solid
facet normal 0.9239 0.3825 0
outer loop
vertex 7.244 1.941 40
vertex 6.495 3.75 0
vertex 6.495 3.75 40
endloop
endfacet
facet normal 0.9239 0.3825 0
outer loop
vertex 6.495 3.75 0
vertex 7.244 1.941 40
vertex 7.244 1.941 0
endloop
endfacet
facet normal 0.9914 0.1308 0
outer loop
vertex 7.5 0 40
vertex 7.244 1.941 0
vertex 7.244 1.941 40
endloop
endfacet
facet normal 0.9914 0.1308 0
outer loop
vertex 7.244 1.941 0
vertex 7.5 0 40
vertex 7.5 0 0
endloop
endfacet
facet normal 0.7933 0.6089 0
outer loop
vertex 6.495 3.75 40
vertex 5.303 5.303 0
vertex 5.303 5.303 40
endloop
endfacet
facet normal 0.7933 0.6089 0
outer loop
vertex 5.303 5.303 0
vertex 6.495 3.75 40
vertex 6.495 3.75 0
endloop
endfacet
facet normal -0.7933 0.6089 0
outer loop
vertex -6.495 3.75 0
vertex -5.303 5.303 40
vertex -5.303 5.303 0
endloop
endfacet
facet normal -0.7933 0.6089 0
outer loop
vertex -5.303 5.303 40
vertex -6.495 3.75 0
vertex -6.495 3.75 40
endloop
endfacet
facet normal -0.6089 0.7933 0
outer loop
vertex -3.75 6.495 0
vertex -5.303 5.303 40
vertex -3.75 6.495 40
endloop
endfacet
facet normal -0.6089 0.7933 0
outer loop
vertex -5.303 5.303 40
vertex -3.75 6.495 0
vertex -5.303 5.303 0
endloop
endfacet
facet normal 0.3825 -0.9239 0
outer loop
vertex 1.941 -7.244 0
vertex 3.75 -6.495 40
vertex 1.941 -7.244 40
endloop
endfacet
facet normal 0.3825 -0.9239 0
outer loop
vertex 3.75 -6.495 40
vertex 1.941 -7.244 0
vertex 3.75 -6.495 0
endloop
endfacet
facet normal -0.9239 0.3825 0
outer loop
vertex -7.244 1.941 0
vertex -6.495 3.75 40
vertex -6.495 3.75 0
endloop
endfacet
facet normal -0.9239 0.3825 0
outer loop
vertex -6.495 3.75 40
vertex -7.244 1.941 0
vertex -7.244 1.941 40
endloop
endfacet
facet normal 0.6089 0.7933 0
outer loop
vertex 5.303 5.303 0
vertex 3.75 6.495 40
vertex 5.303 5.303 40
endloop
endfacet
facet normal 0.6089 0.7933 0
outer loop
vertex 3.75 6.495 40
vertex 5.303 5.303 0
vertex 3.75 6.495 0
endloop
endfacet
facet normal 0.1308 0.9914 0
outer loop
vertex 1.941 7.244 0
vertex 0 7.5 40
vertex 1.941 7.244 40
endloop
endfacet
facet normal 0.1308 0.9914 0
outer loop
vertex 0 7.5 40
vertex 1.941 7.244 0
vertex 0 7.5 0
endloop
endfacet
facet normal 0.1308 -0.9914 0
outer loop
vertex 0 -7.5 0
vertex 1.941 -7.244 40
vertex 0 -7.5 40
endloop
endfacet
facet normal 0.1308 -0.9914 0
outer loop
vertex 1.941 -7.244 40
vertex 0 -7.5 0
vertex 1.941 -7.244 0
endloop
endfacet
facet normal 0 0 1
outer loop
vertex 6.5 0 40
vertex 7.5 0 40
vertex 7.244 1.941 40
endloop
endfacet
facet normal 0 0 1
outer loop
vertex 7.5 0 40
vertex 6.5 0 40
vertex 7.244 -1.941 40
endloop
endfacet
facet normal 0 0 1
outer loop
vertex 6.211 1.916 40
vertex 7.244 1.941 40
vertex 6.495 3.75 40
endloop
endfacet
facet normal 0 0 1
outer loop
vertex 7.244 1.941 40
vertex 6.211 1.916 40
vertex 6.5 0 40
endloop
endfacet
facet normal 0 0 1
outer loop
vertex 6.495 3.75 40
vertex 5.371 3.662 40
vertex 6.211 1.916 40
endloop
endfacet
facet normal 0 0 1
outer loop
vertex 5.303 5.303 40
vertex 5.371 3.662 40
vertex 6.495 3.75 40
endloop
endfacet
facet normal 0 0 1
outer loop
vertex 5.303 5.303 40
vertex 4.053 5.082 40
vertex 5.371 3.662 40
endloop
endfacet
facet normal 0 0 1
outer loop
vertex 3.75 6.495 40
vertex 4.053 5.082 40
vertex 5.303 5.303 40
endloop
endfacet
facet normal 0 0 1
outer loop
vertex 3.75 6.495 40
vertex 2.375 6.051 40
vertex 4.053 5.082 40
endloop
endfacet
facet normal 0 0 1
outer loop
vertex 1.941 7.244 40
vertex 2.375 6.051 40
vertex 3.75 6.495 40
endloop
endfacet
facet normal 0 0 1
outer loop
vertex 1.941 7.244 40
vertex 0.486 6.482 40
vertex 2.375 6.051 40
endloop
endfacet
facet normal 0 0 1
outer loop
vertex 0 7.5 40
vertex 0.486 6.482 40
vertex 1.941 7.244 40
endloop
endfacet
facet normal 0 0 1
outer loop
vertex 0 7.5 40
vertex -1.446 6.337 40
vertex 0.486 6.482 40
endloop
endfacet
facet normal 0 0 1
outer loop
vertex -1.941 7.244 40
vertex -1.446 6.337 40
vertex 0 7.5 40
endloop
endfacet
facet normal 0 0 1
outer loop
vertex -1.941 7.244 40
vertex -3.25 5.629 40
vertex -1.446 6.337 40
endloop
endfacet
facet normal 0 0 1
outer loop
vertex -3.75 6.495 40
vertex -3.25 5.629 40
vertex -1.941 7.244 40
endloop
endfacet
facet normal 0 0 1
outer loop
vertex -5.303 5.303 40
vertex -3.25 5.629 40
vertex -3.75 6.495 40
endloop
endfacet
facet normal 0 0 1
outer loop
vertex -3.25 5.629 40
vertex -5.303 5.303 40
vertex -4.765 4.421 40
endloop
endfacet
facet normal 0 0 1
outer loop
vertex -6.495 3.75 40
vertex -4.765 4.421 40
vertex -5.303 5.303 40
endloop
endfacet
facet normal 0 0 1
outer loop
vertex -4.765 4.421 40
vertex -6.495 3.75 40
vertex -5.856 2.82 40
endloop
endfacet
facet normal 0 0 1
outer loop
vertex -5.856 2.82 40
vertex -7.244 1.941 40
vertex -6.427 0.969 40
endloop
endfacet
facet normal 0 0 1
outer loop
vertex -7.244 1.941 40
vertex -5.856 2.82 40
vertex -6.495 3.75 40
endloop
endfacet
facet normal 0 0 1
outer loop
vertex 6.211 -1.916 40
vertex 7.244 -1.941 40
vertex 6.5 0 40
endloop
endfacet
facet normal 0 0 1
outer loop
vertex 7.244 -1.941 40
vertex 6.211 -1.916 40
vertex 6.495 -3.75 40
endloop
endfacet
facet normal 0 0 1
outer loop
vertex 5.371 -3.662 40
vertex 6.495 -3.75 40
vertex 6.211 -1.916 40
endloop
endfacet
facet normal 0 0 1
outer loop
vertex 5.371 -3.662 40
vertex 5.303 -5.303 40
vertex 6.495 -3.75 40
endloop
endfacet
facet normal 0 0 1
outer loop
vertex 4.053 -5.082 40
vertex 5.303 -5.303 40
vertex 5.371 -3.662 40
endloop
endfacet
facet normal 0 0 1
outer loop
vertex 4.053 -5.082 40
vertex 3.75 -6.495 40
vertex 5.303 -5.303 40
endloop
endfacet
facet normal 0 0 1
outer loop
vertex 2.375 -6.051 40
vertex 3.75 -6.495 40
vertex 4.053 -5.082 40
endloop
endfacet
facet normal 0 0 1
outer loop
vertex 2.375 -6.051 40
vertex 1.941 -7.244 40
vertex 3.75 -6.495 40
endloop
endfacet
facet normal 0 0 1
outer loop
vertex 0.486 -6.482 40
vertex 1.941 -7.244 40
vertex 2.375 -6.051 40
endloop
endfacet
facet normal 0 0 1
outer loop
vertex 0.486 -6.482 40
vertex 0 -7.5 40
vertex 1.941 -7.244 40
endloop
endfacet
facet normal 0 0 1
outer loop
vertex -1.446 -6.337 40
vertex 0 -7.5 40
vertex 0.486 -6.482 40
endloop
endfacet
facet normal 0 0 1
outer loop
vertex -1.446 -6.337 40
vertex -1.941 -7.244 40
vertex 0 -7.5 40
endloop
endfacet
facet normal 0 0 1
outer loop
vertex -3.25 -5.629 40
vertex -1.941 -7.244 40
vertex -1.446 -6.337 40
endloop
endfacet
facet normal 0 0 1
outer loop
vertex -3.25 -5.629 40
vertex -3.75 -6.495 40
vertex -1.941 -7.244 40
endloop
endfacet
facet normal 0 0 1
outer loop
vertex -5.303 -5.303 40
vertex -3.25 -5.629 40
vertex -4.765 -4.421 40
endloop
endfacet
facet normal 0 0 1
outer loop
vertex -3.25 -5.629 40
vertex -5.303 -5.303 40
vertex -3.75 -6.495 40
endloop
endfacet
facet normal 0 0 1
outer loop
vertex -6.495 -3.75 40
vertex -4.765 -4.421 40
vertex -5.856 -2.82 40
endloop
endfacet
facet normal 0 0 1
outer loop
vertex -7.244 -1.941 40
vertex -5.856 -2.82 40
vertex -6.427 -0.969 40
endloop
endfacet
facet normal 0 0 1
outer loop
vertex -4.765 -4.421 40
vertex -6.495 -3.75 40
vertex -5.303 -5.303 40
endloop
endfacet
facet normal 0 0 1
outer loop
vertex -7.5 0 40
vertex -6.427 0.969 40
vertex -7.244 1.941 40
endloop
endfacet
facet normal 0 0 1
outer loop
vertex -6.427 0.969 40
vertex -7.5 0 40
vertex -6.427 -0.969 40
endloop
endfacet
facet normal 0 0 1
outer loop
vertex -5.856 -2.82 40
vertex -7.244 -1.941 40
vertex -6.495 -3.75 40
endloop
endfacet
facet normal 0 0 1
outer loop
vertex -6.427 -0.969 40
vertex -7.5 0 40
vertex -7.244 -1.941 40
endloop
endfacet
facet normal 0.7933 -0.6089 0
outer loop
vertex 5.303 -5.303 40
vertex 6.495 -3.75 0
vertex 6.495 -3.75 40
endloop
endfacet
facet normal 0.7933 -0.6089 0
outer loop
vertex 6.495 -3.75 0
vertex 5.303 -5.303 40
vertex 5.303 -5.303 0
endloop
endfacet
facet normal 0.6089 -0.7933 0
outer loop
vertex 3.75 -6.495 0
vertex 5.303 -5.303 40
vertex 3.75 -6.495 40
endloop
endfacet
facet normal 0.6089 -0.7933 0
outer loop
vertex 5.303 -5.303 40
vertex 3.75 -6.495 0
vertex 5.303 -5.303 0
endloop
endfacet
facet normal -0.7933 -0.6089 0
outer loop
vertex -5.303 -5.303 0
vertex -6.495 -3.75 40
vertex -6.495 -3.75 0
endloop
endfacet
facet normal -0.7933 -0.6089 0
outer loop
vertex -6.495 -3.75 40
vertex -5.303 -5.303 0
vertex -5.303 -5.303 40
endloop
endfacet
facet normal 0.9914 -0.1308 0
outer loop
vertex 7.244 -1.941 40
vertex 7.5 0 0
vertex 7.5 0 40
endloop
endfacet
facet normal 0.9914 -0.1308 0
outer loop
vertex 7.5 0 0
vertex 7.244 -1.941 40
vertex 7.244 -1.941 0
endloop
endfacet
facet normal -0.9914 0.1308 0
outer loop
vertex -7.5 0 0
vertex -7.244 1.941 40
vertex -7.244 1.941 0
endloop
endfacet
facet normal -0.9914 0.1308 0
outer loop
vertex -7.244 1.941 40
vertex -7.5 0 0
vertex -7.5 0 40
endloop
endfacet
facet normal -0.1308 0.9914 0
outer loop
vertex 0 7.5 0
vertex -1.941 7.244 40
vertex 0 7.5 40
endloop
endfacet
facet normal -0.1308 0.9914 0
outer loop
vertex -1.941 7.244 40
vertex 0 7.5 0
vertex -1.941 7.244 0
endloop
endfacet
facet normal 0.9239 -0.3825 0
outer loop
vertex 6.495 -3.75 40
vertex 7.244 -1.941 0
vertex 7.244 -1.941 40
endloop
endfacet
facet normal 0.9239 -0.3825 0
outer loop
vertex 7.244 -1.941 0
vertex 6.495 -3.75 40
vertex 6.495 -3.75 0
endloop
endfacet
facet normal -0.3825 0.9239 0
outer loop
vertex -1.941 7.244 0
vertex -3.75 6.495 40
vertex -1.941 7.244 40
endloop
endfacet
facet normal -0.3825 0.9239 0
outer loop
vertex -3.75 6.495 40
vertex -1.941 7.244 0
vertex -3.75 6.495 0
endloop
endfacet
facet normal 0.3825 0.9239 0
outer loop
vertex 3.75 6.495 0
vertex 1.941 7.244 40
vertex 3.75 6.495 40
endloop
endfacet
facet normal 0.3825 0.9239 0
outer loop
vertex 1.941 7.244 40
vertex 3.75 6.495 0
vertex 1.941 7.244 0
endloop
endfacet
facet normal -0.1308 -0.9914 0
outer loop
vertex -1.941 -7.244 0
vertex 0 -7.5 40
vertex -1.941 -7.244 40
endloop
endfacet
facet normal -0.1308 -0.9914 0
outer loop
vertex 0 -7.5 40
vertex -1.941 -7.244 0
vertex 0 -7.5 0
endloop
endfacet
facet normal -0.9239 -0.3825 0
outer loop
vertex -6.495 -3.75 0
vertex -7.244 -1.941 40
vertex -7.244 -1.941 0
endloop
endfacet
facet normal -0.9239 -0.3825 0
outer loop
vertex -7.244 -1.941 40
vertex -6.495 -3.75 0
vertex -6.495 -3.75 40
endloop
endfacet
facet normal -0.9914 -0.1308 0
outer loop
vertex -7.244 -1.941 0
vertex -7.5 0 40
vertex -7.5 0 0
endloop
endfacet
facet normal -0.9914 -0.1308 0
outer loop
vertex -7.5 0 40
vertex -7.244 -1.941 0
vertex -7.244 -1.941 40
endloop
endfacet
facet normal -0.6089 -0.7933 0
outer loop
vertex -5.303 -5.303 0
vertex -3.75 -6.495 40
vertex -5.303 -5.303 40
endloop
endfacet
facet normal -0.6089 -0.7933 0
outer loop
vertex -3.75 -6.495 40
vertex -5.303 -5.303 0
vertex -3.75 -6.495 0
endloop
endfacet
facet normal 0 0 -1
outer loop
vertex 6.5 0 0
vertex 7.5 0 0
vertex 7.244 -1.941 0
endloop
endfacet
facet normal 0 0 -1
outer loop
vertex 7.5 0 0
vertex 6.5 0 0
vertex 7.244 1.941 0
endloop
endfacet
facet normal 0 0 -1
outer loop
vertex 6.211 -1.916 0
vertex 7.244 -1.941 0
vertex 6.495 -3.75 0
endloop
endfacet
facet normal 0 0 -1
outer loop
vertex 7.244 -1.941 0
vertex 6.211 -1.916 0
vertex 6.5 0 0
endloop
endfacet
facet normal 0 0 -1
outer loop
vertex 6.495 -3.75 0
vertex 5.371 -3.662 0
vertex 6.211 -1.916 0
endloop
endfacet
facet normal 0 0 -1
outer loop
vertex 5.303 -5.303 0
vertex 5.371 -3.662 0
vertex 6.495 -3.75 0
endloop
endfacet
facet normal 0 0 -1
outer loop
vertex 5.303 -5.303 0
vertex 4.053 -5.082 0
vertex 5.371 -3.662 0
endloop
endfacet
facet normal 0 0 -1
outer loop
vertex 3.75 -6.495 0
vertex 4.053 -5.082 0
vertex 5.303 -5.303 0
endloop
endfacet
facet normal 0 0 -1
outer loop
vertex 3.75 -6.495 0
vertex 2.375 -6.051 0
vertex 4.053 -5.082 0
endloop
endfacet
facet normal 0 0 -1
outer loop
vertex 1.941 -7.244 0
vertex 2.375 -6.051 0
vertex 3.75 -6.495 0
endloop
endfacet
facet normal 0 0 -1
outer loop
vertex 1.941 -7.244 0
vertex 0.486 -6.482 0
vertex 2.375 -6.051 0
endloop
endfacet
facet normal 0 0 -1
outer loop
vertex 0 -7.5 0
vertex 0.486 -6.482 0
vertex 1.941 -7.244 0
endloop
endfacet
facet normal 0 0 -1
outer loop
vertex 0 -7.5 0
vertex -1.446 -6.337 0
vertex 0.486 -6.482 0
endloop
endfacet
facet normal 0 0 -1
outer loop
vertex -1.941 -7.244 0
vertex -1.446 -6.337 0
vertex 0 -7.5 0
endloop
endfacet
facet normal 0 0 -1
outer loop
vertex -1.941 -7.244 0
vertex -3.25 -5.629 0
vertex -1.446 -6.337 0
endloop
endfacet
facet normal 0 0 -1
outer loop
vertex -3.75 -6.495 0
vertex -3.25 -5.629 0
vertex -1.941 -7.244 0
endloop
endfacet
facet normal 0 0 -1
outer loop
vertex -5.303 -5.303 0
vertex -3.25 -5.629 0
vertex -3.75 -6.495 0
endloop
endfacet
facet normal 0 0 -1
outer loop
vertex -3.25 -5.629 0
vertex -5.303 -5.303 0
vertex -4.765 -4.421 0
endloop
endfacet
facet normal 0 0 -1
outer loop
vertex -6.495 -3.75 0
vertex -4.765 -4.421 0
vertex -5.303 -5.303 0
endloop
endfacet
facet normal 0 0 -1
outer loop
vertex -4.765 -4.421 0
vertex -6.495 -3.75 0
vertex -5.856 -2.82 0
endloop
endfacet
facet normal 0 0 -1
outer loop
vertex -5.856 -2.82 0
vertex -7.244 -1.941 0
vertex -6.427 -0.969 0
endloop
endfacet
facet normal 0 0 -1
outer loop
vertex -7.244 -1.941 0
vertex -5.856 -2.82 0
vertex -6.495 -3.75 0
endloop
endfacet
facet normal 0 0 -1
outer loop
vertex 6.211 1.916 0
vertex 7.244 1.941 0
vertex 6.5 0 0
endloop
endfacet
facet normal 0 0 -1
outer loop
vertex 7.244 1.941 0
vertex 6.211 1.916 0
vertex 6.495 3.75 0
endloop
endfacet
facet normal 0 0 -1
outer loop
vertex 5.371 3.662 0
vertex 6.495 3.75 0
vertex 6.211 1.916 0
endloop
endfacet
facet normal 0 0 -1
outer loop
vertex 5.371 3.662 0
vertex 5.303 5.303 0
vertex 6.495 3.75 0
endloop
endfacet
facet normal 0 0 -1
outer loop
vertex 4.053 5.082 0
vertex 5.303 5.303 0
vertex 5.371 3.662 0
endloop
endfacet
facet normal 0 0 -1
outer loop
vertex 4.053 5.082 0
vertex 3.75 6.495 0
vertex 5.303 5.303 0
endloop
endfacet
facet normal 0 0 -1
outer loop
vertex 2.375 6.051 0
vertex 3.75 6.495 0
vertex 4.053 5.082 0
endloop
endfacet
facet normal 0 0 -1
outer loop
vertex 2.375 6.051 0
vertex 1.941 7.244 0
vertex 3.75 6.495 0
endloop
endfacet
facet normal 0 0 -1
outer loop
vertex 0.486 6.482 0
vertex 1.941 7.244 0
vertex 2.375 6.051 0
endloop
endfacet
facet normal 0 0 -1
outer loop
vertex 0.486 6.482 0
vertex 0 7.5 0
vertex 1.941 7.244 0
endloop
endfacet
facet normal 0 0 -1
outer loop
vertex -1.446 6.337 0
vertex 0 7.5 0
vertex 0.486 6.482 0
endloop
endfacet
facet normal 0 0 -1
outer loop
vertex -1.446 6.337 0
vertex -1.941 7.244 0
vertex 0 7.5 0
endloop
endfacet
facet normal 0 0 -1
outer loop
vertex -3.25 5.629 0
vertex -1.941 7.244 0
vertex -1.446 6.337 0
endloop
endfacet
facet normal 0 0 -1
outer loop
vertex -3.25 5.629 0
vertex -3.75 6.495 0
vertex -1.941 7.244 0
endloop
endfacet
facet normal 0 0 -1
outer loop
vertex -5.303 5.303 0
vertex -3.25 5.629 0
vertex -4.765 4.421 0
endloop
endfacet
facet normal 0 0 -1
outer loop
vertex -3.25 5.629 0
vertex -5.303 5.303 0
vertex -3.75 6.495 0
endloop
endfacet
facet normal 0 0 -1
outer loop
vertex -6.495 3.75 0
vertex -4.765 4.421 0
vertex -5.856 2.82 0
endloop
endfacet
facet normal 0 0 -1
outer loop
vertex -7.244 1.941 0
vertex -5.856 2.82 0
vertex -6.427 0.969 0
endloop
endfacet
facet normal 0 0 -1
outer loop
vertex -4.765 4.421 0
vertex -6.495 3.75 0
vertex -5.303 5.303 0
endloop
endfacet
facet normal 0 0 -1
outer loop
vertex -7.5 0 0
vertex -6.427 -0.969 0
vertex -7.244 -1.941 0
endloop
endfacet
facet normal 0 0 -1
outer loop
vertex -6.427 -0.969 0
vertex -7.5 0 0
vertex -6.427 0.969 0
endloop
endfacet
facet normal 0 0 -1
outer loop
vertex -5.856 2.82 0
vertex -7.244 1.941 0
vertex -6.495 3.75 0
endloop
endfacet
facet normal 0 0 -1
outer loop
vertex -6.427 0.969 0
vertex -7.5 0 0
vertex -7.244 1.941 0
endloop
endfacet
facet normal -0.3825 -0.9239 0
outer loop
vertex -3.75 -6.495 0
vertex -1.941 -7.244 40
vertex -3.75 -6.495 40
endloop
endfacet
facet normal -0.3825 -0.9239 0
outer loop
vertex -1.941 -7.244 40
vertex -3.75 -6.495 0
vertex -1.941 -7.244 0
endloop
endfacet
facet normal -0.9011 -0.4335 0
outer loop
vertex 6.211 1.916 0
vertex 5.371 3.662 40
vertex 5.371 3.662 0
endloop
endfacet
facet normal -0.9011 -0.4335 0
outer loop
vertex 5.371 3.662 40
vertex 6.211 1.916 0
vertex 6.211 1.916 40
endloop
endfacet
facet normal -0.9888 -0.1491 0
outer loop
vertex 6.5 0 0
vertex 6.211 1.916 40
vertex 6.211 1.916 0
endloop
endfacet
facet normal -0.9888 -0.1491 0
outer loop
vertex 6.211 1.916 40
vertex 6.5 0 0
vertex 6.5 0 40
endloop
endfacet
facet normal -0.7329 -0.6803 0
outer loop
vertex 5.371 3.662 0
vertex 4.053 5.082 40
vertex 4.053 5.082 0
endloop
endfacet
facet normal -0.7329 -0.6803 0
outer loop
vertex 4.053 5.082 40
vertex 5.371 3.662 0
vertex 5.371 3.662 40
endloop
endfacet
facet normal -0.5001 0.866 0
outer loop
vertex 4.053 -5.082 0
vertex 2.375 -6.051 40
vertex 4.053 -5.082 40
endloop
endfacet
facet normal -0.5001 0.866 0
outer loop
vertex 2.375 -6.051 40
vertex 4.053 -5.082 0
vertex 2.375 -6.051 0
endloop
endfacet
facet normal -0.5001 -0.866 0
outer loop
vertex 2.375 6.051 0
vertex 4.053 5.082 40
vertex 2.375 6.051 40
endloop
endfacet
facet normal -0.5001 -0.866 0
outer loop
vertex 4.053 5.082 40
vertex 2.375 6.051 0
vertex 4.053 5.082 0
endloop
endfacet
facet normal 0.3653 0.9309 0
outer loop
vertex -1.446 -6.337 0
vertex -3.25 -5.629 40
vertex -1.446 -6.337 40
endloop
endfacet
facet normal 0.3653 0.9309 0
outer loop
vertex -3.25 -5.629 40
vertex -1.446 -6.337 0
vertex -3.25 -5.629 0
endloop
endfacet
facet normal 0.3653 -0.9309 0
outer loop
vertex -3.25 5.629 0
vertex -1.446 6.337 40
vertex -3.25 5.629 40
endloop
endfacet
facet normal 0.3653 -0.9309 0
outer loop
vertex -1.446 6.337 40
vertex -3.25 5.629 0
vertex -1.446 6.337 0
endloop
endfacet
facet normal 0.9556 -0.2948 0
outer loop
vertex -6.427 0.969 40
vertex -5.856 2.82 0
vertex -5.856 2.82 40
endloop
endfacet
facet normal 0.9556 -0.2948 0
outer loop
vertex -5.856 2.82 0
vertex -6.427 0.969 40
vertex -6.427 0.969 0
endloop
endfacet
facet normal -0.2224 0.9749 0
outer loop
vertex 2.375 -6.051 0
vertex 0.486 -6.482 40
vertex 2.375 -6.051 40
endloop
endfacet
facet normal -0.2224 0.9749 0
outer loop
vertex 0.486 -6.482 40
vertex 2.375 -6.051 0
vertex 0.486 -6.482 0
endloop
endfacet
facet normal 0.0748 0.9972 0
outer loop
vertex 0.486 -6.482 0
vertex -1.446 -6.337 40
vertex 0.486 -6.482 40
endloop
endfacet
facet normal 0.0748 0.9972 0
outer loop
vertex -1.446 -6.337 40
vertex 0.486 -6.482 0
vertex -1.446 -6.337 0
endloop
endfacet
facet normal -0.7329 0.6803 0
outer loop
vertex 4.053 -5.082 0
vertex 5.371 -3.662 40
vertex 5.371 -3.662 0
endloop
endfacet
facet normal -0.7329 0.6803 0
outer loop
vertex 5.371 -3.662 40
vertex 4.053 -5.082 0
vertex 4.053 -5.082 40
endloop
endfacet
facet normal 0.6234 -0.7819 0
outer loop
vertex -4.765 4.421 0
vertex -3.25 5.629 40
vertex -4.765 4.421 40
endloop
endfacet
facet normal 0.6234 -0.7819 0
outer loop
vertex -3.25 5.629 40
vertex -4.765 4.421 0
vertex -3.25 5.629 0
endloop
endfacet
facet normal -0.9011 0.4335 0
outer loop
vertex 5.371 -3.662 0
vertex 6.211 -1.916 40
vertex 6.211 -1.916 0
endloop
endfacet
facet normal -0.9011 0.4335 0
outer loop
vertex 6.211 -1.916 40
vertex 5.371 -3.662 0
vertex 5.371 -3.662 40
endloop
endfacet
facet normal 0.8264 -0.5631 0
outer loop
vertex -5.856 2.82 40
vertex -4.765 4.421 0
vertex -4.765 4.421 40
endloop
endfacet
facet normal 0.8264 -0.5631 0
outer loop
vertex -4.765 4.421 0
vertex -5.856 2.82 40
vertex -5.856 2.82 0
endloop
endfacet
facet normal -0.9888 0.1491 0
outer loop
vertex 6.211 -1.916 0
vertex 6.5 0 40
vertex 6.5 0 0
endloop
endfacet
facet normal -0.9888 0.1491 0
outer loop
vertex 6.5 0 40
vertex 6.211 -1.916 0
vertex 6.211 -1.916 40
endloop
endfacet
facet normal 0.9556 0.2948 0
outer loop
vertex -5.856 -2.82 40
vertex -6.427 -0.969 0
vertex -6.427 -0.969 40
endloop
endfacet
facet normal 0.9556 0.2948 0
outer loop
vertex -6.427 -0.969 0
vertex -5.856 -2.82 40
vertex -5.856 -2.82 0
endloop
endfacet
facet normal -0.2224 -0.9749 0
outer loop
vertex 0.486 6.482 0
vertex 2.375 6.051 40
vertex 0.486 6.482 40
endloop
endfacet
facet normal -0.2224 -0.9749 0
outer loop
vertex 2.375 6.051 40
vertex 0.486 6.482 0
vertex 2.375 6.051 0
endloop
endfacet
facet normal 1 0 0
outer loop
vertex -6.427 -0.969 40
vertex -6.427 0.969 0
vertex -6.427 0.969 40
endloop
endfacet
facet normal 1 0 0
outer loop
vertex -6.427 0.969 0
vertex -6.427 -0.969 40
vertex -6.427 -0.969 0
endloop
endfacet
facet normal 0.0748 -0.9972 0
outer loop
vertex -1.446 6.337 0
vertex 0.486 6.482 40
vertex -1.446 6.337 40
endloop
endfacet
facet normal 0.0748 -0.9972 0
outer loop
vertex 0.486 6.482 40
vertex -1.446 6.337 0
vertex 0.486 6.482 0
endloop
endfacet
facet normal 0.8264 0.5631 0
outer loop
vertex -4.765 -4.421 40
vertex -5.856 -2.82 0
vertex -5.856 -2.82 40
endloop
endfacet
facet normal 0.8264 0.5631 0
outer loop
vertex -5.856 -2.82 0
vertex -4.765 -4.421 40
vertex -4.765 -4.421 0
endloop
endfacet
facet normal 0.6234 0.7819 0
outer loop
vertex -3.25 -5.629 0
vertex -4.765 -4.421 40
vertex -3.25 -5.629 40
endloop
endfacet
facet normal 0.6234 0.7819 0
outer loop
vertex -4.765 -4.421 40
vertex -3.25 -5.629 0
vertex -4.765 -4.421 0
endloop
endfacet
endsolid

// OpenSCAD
difference()
{
	cylinder(h=40,d=15);
	cylinder(h=40,d=13);
}
